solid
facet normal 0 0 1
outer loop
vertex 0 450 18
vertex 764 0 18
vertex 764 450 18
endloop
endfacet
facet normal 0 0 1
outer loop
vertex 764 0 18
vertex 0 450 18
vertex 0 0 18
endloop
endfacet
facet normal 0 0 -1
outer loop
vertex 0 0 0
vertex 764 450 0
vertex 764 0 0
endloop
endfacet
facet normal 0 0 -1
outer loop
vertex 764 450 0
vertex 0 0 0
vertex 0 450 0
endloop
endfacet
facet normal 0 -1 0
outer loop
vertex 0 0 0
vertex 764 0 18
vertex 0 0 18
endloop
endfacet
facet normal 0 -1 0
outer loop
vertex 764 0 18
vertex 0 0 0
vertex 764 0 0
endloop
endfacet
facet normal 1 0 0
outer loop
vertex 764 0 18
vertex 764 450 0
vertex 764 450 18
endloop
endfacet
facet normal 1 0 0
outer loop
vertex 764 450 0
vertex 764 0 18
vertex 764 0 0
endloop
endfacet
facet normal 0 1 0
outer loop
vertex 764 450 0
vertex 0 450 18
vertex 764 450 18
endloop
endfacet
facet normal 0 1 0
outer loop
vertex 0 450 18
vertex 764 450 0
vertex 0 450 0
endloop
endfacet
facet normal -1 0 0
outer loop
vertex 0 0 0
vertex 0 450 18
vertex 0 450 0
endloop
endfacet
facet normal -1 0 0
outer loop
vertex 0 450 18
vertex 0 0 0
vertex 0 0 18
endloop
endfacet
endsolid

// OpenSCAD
// file: ../config/TF3D-SDC-01_dimensions.scad
// Modelo fijo TF3D-SDC-01 — unidades en mm
CABINET_W = 800;
CABINET_H = 1000;
CABINET_D = 500;
BOARD_T = 18;
INNER_W = CABINET_W - 2*BOARD_T;
INNER_H = CABINET_H - 2*BOARD_T;
BACK_W = INNER_W;
BACK_H = INNER_H;
BACK_T = BOARD_T;
SHELF_W = INNER_W;
SHELF_D = 450;
SHELF_T = BOARD_T;
TECH_H = 160;
SHELF_Z_1 = 250;
SHELF_Z_2 = 480;
SHELF_Z_3 = 710;
MELAMINE = [0.94,0.94,0.94];
ACRYLIC = [0.65,0.85,1.00,0.30];
METAL = [0.10,0.10,0.10];
// file: ../config/common.scad
include <TF3D-SDC-01_dimensions.scad>
module board(size=[100,100,18], board_color=MELAMINE){ color(board_color) cube(size); }
// main file
include <../config/common.scad>
board([SHELF_W,SHELF_D,SHELF_T]);
